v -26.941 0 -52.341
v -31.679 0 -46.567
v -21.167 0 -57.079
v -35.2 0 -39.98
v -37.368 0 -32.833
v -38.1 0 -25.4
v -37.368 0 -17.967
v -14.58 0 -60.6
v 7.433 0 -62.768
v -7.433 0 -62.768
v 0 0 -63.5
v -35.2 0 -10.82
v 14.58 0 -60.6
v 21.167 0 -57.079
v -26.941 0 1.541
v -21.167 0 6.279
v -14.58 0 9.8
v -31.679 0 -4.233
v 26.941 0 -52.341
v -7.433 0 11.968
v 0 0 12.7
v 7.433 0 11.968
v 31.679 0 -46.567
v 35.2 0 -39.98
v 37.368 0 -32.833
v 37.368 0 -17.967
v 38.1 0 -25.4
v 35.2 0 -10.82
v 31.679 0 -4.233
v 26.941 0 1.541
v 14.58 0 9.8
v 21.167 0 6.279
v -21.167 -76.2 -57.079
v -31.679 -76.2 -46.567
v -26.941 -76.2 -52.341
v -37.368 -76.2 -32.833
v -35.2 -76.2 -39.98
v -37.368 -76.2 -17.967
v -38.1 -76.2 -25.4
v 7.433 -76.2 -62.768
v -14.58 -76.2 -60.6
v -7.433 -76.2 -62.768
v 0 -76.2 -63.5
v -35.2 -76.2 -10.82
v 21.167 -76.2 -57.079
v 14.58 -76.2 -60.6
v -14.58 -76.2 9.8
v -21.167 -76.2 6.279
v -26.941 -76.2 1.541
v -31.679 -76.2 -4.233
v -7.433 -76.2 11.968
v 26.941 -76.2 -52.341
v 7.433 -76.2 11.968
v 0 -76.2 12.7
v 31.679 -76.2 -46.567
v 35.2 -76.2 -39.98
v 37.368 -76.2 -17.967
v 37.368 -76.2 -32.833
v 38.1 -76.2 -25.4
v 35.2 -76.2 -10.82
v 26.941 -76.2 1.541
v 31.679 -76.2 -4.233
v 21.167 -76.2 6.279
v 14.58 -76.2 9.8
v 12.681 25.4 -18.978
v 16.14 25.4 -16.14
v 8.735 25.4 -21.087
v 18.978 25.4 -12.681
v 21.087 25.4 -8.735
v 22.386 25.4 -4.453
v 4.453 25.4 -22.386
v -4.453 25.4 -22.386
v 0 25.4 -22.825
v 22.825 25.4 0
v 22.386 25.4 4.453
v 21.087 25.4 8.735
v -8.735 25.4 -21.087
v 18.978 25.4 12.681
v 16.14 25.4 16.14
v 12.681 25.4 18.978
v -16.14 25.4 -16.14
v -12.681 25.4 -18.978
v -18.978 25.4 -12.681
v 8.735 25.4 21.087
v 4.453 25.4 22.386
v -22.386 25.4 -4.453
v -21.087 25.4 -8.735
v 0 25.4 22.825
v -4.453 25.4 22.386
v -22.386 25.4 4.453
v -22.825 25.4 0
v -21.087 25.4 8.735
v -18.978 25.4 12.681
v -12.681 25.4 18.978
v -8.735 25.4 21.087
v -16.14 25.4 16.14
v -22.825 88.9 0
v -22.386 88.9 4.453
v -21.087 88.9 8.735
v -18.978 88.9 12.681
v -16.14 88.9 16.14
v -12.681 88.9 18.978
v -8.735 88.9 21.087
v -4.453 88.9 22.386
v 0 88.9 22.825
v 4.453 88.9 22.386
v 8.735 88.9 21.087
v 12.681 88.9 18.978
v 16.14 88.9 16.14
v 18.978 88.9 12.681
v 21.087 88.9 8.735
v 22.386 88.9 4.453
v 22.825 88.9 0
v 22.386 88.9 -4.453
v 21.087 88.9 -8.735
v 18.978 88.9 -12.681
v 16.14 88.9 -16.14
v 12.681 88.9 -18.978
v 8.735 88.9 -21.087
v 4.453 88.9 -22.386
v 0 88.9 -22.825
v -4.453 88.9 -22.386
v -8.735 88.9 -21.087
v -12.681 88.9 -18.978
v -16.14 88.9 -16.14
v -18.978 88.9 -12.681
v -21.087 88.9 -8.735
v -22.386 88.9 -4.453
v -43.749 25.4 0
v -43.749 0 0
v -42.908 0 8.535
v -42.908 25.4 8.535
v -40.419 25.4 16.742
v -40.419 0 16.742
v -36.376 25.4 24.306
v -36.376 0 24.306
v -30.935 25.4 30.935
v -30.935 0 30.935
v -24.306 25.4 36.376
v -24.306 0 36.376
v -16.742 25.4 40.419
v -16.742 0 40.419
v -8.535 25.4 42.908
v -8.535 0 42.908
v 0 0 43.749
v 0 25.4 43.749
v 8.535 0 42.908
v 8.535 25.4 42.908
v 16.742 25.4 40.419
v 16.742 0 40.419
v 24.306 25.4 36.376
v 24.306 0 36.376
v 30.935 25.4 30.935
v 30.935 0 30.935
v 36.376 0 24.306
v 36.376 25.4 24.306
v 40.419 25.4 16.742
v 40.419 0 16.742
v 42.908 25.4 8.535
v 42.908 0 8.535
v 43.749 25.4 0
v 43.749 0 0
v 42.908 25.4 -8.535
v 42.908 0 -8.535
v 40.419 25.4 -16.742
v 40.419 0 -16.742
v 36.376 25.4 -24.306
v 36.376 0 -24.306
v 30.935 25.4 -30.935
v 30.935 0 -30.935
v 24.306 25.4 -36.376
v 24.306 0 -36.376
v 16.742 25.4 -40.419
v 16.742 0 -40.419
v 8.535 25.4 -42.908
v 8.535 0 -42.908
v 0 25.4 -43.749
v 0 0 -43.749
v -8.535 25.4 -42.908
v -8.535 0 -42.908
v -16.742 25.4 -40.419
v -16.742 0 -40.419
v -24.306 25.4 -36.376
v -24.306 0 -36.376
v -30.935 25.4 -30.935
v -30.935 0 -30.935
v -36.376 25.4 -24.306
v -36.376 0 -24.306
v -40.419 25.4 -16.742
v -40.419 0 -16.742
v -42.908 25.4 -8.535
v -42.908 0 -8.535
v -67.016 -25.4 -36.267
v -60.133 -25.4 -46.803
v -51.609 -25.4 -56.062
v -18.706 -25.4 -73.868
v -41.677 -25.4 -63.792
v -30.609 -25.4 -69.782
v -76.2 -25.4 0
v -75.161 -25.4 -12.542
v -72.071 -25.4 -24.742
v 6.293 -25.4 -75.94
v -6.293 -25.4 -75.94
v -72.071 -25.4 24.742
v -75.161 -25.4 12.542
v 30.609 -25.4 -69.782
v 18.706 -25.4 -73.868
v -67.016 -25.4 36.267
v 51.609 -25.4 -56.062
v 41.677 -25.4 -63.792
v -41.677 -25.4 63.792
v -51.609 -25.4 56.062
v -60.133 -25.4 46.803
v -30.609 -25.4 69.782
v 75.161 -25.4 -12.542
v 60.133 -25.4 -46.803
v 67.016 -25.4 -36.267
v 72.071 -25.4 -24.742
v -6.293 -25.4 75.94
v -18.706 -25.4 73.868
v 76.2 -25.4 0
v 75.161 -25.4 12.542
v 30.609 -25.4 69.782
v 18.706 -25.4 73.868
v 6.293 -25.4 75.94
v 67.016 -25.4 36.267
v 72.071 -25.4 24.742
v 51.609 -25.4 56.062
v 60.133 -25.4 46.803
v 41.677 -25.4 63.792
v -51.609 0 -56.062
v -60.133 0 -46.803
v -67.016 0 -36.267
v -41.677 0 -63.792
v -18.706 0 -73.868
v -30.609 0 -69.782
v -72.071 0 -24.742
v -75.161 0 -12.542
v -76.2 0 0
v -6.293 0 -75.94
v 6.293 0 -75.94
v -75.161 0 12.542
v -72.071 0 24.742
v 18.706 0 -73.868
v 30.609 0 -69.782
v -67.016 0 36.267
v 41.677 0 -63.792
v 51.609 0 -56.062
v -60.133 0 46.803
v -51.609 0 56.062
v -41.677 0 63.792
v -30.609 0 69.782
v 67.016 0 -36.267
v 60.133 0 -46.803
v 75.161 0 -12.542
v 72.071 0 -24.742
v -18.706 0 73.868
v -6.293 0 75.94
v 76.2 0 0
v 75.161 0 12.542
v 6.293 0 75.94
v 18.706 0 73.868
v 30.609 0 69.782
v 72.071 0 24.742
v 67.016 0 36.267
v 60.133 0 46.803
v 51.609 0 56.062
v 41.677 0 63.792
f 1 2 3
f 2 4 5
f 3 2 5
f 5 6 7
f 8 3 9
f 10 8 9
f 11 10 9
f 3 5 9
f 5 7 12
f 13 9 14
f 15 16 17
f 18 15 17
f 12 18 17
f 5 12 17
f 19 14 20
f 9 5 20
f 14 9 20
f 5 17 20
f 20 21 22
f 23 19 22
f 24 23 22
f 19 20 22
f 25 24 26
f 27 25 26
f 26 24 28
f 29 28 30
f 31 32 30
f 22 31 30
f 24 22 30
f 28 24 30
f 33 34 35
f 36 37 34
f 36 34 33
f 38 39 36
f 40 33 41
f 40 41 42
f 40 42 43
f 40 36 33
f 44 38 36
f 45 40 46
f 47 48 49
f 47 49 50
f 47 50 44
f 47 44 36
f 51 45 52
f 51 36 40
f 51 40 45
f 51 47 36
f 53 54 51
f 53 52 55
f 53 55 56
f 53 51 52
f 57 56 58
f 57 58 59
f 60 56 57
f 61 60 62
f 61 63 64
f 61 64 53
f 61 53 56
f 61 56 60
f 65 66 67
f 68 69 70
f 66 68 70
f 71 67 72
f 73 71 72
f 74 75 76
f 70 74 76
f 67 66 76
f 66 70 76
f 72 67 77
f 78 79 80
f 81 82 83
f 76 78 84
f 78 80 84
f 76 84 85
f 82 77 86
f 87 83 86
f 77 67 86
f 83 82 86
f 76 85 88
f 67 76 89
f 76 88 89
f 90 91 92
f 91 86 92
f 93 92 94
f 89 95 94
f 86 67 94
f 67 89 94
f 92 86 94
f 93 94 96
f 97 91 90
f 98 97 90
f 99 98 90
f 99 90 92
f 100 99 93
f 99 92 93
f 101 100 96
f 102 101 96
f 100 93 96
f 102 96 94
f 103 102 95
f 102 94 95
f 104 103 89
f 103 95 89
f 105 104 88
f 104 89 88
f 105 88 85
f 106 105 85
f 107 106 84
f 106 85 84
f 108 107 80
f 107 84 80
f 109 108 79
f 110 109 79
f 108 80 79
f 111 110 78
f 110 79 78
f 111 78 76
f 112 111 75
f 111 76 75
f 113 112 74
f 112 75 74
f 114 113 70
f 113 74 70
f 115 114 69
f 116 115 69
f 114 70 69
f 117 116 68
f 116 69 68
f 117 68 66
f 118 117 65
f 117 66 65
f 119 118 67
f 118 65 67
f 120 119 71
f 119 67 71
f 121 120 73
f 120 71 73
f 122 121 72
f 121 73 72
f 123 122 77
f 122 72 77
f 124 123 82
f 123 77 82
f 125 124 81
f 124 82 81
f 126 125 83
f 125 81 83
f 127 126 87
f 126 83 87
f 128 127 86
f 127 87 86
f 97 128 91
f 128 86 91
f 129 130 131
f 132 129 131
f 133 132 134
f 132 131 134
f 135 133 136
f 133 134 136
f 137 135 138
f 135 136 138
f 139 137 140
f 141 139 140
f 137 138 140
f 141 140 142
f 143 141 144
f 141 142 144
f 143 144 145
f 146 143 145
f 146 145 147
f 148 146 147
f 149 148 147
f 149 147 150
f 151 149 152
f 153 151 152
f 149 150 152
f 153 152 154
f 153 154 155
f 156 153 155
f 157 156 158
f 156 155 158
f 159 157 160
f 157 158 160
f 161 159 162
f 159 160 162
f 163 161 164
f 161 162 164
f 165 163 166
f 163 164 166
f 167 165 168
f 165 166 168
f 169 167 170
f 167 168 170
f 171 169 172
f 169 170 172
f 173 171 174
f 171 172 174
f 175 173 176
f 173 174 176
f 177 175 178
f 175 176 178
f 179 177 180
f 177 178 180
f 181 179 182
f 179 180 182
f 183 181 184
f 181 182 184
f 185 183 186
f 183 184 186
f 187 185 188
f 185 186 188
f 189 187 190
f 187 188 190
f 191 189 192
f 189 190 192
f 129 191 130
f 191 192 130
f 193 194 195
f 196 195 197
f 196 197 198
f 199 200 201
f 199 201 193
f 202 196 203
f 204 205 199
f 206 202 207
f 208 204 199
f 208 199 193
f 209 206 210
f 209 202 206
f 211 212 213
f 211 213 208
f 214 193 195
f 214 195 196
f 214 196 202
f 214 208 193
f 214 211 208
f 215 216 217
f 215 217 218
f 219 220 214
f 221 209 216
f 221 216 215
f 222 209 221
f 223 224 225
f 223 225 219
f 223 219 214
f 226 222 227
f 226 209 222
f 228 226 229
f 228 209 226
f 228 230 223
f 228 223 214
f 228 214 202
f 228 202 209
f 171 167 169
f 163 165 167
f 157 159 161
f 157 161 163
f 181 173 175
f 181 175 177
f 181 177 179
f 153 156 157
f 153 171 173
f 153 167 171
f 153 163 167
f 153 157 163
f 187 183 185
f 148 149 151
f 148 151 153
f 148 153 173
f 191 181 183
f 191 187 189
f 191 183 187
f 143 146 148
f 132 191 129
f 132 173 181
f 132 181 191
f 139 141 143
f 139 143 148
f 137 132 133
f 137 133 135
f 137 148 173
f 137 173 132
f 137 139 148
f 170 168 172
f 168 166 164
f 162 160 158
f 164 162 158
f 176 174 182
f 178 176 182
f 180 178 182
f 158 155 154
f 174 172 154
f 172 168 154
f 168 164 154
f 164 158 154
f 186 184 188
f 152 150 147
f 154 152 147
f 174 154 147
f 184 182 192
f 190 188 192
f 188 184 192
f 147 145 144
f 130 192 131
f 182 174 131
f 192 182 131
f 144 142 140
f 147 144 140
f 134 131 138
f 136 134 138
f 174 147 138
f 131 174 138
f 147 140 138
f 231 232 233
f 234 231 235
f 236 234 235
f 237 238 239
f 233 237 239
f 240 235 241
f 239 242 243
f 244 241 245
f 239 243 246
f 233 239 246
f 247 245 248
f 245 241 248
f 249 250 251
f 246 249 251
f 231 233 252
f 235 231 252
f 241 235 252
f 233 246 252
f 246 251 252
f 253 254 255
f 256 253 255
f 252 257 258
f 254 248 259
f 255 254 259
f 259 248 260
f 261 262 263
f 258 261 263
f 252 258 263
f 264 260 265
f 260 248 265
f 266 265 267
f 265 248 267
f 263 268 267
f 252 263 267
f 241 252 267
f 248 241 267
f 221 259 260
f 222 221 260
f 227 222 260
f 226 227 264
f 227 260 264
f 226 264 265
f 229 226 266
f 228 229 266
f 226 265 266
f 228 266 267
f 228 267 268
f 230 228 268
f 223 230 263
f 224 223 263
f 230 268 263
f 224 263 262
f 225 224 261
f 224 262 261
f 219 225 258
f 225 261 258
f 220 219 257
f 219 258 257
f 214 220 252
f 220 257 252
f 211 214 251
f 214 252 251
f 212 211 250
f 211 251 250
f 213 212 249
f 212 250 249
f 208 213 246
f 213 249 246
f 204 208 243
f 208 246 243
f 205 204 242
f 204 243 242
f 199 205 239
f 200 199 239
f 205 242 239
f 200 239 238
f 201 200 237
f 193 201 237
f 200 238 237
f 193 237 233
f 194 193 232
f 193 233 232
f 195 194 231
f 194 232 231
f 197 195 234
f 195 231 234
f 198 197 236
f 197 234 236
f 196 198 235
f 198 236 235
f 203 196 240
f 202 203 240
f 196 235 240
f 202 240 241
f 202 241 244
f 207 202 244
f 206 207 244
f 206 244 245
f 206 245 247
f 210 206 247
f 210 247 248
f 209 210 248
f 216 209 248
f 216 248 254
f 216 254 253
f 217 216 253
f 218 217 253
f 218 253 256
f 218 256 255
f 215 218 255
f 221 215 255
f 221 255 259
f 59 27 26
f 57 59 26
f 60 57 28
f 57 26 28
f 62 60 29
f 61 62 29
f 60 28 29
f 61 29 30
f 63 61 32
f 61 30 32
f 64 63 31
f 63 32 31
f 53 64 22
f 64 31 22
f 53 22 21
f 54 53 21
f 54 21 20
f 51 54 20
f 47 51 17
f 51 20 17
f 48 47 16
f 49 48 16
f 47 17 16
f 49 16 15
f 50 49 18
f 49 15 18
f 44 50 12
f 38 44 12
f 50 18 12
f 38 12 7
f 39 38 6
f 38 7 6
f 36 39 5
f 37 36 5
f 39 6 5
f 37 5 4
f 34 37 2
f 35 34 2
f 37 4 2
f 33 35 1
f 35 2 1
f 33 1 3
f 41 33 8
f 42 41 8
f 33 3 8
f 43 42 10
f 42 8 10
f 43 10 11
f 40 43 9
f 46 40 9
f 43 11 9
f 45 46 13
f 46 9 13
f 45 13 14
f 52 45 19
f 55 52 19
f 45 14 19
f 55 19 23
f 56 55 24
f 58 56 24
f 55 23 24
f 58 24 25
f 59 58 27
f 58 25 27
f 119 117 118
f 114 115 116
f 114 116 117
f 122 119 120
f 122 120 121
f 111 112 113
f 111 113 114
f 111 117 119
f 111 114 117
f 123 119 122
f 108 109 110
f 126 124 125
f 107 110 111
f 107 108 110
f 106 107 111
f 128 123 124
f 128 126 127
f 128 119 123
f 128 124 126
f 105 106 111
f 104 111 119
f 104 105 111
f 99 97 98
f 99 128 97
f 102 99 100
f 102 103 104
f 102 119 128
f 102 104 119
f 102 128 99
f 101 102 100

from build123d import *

# Parameters (mm, degrees)
F0_R     = 76.2
F1_DEPTH = 25.4
F2_R     = 38.1
F3_DEPTH = 76.2
F5_R     = 43.7488165657
F6_DEPTH = 25.4
F7_R     = 22.8249074769
F8_DEPTH = 63.5


# Not quite as in the source:
# - the program builds the solid bodies; features that only make, move or delete a surface that nothing else refers to are left out


with BuildPart() as f1:
    # F0 (on Front) → F1 (new body)
    with BuildSketch(Plane.XZ):
        Circle(F0_R)
    extrude(amount=F1_DEPTH)


with BuildPart() as f3:
    # F2 (on Front) → F3 (new body)
    with BuildSketch(Plane.XZ):
        with Locations((0, -25.4)):
            Circle(F2_R)
    extrude(amount=F3_DEPTH)


with BuildPart() as f6:
    # F5 (on face) → F6 (new body)
    with BuildSketch(Plane(origin=(0, 0, 0), x_dir=(-1, 0, 0), z_dir=(0, 1, 0))):
        Circle(F5_R)
    extrude(amount=F6_DEPTH)


with BuildPart() as f8:
    # F7 (on face) → F8 (new body)
    with BuildSketch(Plane(origin=(0, 25.4, 0), x_dir=(-1, 0, 0), z_dir=(0, 1, 0))):
        Circle(F7_R)
    extrude(amount=F8_DEPTH)


solid = Compound([f1.part, f3.part, f6.part, f8.part])
